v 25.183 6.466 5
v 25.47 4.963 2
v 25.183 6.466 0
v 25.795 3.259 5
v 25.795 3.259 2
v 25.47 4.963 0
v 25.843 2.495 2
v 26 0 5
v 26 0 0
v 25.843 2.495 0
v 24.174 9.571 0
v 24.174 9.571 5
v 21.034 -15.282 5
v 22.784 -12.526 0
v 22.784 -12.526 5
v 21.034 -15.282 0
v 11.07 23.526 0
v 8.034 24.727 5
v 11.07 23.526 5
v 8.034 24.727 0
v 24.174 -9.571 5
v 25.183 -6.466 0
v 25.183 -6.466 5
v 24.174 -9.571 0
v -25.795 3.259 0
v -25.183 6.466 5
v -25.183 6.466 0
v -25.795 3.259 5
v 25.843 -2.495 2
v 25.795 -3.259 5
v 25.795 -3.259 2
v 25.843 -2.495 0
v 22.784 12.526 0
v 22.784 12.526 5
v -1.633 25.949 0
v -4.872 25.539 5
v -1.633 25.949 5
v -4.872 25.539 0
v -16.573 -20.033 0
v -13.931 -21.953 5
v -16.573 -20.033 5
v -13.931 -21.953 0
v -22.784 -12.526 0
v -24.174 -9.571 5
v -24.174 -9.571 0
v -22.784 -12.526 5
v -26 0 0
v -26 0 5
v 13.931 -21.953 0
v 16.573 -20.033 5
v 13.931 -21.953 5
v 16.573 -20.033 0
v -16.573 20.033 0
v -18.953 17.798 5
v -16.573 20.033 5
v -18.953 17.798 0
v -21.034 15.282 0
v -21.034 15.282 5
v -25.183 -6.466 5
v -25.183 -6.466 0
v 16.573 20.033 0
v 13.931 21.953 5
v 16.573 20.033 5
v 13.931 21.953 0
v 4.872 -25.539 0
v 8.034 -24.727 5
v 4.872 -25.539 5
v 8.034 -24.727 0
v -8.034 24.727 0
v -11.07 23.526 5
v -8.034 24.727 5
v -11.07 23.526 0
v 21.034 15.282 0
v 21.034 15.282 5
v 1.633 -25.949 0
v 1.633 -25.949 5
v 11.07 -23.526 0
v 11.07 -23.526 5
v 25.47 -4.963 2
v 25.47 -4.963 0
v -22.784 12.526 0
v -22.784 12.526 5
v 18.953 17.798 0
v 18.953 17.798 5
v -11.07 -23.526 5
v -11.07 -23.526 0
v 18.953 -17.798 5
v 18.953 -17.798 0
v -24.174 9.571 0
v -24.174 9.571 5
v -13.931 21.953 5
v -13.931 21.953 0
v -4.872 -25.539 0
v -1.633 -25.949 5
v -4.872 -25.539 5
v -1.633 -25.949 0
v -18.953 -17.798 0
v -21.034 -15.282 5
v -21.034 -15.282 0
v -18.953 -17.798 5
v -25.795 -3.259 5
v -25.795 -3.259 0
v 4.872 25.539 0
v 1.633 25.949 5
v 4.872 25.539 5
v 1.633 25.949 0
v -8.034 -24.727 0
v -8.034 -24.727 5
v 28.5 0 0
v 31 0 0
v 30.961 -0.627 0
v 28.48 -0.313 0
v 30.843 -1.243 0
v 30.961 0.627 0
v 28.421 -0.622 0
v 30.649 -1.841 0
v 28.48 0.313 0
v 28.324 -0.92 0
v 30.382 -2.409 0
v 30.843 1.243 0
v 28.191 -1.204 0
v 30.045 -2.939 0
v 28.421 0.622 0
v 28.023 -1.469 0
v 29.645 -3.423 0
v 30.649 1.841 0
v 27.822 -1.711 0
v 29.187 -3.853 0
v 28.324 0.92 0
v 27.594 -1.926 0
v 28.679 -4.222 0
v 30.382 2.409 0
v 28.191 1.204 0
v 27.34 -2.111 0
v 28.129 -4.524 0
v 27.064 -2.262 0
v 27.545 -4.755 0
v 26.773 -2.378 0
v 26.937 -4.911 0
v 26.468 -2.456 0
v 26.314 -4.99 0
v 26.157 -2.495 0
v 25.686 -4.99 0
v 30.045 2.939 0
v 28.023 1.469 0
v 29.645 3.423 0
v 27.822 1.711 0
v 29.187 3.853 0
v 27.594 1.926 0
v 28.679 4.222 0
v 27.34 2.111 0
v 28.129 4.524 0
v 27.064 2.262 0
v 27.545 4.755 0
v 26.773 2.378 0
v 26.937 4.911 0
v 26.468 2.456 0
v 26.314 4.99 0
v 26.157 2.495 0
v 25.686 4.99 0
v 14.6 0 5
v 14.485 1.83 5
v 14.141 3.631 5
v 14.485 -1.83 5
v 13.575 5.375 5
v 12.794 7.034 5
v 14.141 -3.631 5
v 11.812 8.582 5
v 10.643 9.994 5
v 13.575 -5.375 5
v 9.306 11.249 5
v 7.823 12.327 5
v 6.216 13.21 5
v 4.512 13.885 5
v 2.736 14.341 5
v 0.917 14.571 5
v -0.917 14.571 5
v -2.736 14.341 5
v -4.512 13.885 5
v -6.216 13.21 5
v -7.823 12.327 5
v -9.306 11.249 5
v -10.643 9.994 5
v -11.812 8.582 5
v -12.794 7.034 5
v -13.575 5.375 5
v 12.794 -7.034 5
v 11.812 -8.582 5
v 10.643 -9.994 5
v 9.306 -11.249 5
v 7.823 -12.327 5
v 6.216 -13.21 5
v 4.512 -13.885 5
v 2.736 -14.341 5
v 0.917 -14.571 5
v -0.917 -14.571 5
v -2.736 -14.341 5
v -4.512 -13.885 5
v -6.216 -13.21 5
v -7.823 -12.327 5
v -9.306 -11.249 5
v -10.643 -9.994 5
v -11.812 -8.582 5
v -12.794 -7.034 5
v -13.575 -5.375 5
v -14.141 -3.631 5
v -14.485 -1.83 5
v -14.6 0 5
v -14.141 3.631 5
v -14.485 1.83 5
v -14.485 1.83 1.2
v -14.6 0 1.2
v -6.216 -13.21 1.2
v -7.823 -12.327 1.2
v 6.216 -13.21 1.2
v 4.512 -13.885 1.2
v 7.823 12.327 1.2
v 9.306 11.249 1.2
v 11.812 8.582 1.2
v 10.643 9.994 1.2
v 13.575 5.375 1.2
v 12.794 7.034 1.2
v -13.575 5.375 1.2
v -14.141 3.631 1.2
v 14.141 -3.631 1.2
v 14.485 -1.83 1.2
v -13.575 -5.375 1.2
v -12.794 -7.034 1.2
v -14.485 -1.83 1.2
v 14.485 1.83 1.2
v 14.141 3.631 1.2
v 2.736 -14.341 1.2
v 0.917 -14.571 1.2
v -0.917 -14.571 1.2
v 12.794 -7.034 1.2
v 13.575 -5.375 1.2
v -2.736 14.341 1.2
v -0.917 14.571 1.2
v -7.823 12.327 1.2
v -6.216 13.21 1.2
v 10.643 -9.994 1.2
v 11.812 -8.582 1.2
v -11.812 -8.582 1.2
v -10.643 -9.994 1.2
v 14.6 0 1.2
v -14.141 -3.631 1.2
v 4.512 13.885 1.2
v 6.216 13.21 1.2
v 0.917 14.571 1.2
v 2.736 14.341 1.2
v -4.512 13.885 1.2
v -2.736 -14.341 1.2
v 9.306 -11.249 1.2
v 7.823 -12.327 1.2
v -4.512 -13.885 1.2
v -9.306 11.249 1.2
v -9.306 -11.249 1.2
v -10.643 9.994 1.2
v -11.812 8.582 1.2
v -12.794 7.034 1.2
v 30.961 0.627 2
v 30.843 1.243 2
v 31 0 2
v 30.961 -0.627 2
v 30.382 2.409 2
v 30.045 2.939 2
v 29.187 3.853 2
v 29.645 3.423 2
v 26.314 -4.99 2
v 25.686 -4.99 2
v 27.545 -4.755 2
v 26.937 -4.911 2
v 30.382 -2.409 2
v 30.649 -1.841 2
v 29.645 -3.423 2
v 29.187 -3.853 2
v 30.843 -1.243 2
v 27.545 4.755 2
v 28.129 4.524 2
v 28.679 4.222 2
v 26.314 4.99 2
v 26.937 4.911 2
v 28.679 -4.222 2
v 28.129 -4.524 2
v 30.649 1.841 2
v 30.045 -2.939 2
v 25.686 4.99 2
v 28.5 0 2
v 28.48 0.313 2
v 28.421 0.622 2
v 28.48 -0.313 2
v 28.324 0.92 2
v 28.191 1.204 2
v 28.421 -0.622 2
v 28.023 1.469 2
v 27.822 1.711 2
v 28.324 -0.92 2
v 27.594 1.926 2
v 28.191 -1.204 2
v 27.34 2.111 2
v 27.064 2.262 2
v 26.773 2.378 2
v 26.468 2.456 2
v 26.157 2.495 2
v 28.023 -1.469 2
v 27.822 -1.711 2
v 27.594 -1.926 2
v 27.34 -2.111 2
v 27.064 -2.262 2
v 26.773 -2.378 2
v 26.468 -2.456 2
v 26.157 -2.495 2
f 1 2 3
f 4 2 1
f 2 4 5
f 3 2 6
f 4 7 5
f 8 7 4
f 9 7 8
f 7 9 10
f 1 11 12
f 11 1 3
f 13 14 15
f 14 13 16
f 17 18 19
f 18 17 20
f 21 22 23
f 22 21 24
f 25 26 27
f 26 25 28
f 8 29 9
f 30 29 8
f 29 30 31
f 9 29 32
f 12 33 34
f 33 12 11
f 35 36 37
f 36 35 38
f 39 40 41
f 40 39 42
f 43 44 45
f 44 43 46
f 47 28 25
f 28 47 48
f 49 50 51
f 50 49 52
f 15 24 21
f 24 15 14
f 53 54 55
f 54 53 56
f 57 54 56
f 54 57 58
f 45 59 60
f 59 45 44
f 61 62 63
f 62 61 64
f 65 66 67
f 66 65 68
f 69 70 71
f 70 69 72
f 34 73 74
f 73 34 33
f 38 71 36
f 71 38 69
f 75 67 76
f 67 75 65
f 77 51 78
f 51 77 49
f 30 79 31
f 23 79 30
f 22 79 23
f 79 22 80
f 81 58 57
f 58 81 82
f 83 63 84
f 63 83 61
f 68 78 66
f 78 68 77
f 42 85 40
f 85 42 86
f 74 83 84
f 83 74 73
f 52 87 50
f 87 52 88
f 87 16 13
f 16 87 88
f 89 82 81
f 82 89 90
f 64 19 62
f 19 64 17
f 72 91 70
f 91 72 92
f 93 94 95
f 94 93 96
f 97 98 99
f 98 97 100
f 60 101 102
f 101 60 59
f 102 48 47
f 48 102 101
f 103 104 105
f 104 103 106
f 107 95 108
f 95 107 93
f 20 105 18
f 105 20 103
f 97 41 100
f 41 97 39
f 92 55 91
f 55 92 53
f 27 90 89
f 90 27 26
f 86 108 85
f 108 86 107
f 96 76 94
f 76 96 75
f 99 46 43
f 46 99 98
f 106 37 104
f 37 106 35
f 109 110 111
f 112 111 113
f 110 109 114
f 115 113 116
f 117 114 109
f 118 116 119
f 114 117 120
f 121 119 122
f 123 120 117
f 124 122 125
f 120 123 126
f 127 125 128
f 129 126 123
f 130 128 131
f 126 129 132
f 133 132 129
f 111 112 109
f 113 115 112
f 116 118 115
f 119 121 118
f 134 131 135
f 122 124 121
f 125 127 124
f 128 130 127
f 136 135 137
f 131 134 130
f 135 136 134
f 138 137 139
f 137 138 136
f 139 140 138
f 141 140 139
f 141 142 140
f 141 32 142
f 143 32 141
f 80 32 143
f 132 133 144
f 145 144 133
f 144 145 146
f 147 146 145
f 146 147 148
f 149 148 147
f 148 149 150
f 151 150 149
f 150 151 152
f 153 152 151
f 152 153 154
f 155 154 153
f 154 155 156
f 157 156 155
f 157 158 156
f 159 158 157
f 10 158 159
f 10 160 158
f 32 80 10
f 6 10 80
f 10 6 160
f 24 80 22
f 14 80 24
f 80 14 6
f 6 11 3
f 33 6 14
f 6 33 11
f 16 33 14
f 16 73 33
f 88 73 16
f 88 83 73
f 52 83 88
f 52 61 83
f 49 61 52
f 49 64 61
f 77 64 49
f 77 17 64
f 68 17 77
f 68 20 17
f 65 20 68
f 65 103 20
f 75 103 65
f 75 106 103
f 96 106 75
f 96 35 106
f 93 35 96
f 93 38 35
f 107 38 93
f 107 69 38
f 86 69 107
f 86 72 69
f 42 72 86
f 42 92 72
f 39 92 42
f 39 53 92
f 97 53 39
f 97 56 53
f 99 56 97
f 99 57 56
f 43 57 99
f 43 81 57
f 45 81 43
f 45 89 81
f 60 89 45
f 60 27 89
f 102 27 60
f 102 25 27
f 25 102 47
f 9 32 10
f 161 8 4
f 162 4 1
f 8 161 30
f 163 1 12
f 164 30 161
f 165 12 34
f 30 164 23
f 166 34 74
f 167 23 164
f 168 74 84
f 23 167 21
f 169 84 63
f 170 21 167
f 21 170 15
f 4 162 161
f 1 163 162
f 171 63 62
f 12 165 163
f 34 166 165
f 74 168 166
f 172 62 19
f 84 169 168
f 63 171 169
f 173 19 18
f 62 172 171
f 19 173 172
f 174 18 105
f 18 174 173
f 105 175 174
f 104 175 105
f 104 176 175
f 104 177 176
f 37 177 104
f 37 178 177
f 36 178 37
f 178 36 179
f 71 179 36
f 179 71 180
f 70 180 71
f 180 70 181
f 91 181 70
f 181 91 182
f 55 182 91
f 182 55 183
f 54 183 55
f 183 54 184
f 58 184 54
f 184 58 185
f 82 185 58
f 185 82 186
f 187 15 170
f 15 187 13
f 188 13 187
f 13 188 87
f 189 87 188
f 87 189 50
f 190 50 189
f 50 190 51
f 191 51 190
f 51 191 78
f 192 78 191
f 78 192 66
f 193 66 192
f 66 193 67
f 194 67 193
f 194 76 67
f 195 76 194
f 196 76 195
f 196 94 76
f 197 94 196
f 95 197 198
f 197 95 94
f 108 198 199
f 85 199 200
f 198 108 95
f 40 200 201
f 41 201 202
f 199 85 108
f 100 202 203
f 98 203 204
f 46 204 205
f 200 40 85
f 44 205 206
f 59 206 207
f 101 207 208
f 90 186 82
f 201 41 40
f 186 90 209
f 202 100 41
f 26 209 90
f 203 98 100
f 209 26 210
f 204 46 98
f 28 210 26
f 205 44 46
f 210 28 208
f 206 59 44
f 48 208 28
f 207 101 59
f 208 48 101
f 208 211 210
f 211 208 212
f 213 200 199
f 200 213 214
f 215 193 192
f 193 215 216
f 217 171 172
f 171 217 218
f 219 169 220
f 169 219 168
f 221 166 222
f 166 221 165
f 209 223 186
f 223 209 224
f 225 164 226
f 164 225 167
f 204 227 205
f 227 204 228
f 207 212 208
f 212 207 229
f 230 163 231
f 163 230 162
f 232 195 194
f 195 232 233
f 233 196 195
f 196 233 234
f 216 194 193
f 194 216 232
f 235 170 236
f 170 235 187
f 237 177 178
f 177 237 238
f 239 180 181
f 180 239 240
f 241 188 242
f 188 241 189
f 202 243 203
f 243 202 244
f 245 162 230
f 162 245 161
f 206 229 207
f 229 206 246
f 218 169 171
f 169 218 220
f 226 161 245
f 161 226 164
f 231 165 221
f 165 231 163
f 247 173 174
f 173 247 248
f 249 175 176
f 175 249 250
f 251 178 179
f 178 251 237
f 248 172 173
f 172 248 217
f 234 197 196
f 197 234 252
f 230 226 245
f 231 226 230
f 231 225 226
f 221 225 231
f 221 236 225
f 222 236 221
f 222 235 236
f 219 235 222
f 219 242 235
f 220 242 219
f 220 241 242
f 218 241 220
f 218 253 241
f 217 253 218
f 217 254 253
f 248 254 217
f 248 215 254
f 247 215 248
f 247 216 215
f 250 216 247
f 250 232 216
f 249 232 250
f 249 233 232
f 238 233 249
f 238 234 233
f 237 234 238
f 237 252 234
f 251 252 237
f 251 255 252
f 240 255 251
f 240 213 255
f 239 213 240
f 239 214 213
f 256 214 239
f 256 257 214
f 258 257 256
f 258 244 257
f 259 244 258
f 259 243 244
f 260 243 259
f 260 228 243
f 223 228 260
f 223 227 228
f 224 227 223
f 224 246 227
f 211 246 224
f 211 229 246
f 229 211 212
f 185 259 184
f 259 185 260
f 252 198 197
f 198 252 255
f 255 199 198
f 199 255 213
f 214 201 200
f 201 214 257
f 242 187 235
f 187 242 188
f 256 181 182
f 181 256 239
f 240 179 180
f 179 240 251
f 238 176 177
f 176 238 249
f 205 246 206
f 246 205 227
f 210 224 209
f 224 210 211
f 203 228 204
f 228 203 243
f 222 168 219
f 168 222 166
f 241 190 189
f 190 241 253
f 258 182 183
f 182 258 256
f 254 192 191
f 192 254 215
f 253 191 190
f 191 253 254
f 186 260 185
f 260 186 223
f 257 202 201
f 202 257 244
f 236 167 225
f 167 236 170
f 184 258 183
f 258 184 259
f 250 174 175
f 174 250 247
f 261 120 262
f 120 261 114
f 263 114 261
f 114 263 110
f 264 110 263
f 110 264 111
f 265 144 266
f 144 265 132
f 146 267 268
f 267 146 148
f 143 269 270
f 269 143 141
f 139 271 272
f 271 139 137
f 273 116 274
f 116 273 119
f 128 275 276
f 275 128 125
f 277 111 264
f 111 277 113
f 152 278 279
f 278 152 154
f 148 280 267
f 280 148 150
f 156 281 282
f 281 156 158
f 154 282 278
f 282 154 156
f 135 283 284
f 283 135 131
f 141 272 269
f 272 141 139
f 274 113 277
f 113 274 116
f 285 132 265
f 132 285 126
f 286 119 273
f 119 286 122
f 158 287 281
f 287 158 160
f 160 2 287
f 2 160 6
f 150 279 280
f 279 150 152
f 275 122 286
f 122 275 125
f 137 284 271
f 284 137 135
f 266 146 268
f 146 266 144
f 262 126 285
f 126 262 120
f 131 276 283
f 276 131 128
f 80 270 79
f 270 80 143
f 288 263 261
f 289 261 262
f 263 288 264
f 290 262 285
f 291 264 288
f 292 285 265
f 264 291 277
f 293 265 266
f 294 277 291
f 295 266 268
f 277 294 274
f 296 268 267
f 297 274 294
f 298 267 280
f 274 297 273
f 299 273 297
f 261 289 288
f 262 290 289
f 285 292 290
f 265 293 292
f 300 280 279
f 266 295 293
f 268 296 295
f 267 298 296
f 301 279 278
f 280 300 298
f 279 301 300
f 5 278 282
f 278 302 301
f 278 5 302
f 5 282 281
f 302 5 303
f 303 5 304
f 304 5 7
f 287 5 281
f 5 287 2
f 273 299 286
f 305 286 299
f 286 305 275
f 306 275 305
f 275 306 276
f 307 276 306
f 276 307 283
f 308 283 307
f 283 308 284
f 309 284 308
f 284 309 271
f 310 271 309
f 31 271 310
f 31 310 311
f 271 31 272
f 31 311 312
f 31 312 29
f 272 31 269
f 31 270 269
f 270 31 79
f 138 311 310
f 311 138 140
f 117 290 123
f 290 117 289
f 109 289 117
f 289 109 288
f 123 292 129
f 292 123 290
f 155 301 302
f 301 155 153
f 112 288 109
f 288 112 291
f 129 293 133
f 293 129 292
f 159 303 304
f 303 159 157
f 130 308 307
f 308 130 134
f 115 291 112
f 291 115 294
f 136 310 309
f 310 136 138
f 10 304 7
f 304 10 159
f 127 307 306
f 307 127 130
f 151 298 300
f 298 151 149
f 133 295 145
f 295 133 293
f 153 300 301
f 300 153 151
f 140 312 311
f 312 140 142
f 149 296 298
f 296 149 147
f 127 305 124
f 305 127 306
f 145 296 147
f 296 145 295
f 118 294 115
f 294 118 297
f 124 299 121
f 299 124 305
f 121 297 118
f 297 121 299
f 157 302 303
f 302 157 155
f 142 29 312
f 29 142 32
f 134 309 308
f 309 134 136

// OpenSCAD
module frame(
    frame_r = 26,
    frame_h = 5,
    hole_r  = 14.6,
    hole_h  = 3.8,
    lug_r   = 5,
    lug_h   = 2
  ) {
    difference() {
        cylinder( r = frame_r, h = frame_h );
        translate([ 0, 0, frame_h-hole_h ])
            cylinder( r = hole_r, h = hole_h + 1 );
    }
    translate([ frame_r, 0, 0 ]) {
        difference() {
            cylinder( r = lug_r, h = lug_h );
            translate([ 0, 0, -1 ])
                cylinder( r = lug_r/2, h = lug_h + 2 );
        }
    }
}

frame($fn=50);
